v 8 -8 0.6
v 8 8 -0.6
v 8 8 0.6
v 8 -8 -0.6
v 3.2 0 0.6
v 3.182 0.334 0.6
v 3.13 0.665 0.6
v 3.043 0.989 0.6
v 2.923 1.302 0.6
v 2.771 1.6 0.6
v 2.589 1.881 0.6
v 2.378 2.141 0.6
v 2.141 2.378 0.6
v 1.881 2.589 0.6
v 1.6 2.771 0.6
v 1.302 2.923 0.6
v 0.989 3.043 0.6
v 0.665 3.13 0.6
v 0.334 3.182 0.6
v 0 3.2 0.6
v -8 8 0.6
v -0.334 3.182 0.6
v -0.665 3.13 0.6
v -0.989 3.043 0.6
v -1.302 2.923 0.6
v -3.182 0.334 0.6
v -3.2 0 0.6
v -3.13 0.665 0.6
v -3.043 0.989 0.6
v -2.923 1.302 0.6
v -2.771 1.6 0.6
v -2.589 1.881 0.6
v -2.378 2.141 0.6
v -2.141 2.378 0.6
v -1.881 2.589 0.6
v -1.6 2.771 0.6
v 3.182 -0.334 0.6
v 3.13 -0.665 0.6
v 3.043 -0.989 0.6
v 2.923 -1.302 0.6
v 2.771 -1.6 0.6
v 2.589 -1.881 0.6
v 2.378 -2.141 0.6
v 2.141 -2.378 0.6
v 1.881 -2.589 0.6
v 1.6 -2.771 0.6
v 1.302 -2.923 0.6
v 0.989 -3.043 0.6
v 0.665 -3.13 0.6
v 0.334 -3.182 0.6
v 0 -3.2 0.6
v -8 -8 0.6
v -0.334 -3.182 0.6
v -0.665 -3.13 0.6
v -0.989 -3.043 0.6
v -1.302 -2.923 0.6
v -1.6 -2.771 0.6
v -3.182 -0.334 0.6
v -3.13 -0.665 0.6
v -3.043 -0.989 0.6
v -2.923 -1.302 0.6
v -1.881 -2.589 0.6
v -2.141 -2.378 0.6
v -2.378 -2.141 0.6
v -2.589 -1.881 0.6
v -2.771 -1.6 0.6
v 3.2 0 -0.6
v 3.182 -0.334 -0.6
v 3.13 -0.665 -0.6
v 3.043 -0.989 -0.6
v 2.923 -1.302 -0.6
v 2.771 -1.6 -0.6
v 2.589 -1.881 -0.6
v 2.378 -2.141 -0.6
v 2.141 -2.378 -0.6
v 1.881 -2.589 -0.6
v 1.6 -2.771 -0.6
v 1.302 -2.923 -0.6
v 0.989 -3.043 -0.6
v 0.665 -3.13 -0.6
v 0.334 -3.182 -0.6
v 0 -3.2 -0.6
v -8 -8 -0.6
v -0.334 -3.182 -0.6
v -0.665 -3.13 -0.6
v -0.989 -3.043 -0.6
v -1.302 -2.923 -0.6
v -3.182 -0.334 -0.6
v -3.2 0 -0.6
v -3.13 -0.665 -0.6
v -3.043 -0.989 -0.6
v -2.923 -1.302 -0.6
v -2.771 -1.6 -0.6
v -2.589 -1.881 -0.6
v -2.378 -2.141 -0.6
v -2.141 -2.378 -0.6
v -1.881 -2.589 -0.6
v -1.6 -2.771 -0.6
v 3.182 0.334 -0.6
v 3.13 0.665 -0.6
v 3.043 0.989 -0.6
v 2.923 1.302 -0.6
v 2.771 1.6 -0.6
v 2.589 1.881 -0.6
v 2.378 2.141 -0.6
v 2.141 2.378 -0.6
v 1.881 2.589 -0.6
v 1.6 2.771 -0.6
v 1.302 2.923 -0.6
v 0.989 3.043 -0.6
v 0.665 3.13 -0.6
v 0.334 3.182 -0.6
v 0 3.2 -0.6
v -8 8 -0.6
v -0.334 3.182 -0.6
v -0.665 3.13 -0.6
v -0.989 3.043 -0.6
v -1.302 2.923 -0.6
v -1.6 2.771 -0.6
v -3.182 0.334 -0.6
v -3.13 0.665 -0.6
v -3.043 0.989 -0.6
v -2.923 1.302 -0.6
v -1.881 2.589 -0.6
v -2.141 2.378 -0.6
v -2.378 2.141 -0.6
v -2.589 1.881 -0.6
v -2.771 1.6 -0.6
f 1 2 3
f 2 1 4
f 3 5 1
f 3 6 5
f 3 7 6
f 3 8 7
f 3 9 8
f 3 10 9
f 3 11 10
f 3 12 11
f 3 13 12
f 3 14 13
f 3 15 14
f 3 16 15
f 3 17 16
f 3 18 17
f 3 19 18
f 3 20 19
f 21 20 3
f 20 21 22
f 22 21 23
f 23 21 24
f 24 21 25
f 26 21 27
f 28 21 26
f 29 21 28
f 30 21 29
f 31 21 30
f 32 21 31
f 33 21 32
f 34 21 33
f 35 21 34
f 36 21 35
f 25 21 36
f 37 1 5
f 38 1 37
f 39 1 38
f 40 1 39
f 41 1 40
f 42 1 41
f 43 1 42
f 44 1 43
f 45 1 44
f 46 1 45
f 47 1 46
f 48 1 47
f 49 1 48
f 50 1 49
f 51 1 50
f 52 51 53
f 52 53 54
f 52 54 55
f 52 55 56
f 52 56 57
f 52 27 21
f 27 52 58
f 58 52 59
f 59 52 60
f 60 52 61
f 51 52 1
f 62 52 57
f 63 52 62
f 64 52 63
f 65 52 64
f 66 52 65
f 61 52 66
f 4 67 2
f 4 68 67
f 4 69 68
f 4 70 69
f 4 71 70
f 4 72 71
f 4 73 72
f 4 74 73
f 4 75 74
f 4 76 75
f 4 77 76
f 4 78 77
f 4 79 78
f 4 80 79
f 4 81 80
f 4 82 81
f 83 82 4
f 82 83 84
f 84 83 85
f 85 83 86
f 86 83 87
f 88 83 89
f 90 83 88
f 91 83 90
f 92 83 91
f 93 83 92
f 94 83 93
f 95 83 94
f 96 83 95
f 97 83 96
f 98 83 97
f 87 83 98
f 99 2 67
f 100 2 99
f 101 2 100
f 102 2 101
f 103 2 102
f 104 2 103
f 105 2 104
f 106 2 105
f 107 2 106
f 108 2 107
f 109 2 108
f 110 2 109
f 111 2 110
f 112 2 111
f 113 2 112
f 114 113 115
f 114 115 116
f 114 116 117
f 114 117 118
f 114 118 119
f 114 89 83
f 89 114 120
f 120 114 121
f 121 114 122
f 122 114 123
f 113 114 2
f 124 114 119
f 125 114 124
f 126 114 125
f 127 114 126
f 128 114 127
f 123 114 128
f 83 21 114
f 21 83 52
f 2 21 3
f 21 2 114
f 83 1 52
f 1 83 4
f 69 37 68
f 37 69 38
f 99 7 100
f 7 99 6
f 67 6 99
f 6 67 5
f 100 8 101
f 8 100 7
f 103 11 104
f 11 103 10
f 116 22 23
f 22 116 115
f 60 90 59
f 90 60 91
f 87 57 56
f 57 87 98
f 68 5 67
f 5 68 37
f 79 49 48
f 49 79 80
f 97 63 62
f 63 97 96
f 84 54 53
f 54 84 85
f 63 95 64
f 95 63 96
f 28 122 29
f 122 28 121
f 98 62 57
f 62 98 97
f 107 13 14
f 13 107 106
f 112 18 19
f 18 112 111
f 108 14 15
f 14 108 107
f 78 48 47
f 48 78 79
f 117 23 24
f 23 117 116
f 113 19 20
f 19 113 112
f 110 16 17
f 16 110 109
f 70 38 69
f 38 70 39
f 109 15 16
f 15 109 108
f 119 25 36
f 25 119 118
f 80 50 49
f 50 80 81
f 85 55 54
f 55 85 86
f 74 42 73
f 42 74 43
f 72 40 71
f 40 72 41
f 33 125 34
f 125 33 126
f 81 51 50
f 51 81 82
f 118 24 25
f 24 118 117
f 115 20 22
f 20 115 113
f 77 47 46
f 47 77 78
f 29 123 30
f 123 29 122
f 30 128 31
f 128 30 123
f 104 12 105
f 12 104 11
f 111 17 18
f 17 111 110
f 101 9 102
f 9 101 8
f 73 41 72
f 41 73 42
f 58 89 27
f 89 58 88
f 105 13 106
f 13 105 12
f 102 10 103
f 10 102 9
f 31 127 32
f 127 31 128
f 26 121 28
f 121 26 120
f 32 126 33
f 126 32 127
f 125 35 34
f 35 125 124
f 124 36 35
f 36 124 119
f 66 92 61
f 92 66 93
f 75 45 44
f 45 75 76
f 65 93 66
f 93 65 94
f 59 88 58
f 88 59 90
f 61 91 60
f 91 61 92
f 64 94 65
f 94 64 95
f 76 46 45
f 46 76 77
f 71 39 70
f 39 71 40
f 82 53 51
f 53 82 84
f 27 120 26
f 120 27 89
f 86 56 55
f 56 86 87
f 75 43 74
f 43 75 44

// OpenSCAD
// Square mounting washer.
$fn = 60;
eps = 0.02;
hole_d = 6.4;
side = 16;
thickness = 1.2;
difference() {
    cube([side,side,thickness],center=true);
    translate([0,0,-thickness/2-eps]) cylinder(d=hole_d,h=thickness+2*eps);
}
